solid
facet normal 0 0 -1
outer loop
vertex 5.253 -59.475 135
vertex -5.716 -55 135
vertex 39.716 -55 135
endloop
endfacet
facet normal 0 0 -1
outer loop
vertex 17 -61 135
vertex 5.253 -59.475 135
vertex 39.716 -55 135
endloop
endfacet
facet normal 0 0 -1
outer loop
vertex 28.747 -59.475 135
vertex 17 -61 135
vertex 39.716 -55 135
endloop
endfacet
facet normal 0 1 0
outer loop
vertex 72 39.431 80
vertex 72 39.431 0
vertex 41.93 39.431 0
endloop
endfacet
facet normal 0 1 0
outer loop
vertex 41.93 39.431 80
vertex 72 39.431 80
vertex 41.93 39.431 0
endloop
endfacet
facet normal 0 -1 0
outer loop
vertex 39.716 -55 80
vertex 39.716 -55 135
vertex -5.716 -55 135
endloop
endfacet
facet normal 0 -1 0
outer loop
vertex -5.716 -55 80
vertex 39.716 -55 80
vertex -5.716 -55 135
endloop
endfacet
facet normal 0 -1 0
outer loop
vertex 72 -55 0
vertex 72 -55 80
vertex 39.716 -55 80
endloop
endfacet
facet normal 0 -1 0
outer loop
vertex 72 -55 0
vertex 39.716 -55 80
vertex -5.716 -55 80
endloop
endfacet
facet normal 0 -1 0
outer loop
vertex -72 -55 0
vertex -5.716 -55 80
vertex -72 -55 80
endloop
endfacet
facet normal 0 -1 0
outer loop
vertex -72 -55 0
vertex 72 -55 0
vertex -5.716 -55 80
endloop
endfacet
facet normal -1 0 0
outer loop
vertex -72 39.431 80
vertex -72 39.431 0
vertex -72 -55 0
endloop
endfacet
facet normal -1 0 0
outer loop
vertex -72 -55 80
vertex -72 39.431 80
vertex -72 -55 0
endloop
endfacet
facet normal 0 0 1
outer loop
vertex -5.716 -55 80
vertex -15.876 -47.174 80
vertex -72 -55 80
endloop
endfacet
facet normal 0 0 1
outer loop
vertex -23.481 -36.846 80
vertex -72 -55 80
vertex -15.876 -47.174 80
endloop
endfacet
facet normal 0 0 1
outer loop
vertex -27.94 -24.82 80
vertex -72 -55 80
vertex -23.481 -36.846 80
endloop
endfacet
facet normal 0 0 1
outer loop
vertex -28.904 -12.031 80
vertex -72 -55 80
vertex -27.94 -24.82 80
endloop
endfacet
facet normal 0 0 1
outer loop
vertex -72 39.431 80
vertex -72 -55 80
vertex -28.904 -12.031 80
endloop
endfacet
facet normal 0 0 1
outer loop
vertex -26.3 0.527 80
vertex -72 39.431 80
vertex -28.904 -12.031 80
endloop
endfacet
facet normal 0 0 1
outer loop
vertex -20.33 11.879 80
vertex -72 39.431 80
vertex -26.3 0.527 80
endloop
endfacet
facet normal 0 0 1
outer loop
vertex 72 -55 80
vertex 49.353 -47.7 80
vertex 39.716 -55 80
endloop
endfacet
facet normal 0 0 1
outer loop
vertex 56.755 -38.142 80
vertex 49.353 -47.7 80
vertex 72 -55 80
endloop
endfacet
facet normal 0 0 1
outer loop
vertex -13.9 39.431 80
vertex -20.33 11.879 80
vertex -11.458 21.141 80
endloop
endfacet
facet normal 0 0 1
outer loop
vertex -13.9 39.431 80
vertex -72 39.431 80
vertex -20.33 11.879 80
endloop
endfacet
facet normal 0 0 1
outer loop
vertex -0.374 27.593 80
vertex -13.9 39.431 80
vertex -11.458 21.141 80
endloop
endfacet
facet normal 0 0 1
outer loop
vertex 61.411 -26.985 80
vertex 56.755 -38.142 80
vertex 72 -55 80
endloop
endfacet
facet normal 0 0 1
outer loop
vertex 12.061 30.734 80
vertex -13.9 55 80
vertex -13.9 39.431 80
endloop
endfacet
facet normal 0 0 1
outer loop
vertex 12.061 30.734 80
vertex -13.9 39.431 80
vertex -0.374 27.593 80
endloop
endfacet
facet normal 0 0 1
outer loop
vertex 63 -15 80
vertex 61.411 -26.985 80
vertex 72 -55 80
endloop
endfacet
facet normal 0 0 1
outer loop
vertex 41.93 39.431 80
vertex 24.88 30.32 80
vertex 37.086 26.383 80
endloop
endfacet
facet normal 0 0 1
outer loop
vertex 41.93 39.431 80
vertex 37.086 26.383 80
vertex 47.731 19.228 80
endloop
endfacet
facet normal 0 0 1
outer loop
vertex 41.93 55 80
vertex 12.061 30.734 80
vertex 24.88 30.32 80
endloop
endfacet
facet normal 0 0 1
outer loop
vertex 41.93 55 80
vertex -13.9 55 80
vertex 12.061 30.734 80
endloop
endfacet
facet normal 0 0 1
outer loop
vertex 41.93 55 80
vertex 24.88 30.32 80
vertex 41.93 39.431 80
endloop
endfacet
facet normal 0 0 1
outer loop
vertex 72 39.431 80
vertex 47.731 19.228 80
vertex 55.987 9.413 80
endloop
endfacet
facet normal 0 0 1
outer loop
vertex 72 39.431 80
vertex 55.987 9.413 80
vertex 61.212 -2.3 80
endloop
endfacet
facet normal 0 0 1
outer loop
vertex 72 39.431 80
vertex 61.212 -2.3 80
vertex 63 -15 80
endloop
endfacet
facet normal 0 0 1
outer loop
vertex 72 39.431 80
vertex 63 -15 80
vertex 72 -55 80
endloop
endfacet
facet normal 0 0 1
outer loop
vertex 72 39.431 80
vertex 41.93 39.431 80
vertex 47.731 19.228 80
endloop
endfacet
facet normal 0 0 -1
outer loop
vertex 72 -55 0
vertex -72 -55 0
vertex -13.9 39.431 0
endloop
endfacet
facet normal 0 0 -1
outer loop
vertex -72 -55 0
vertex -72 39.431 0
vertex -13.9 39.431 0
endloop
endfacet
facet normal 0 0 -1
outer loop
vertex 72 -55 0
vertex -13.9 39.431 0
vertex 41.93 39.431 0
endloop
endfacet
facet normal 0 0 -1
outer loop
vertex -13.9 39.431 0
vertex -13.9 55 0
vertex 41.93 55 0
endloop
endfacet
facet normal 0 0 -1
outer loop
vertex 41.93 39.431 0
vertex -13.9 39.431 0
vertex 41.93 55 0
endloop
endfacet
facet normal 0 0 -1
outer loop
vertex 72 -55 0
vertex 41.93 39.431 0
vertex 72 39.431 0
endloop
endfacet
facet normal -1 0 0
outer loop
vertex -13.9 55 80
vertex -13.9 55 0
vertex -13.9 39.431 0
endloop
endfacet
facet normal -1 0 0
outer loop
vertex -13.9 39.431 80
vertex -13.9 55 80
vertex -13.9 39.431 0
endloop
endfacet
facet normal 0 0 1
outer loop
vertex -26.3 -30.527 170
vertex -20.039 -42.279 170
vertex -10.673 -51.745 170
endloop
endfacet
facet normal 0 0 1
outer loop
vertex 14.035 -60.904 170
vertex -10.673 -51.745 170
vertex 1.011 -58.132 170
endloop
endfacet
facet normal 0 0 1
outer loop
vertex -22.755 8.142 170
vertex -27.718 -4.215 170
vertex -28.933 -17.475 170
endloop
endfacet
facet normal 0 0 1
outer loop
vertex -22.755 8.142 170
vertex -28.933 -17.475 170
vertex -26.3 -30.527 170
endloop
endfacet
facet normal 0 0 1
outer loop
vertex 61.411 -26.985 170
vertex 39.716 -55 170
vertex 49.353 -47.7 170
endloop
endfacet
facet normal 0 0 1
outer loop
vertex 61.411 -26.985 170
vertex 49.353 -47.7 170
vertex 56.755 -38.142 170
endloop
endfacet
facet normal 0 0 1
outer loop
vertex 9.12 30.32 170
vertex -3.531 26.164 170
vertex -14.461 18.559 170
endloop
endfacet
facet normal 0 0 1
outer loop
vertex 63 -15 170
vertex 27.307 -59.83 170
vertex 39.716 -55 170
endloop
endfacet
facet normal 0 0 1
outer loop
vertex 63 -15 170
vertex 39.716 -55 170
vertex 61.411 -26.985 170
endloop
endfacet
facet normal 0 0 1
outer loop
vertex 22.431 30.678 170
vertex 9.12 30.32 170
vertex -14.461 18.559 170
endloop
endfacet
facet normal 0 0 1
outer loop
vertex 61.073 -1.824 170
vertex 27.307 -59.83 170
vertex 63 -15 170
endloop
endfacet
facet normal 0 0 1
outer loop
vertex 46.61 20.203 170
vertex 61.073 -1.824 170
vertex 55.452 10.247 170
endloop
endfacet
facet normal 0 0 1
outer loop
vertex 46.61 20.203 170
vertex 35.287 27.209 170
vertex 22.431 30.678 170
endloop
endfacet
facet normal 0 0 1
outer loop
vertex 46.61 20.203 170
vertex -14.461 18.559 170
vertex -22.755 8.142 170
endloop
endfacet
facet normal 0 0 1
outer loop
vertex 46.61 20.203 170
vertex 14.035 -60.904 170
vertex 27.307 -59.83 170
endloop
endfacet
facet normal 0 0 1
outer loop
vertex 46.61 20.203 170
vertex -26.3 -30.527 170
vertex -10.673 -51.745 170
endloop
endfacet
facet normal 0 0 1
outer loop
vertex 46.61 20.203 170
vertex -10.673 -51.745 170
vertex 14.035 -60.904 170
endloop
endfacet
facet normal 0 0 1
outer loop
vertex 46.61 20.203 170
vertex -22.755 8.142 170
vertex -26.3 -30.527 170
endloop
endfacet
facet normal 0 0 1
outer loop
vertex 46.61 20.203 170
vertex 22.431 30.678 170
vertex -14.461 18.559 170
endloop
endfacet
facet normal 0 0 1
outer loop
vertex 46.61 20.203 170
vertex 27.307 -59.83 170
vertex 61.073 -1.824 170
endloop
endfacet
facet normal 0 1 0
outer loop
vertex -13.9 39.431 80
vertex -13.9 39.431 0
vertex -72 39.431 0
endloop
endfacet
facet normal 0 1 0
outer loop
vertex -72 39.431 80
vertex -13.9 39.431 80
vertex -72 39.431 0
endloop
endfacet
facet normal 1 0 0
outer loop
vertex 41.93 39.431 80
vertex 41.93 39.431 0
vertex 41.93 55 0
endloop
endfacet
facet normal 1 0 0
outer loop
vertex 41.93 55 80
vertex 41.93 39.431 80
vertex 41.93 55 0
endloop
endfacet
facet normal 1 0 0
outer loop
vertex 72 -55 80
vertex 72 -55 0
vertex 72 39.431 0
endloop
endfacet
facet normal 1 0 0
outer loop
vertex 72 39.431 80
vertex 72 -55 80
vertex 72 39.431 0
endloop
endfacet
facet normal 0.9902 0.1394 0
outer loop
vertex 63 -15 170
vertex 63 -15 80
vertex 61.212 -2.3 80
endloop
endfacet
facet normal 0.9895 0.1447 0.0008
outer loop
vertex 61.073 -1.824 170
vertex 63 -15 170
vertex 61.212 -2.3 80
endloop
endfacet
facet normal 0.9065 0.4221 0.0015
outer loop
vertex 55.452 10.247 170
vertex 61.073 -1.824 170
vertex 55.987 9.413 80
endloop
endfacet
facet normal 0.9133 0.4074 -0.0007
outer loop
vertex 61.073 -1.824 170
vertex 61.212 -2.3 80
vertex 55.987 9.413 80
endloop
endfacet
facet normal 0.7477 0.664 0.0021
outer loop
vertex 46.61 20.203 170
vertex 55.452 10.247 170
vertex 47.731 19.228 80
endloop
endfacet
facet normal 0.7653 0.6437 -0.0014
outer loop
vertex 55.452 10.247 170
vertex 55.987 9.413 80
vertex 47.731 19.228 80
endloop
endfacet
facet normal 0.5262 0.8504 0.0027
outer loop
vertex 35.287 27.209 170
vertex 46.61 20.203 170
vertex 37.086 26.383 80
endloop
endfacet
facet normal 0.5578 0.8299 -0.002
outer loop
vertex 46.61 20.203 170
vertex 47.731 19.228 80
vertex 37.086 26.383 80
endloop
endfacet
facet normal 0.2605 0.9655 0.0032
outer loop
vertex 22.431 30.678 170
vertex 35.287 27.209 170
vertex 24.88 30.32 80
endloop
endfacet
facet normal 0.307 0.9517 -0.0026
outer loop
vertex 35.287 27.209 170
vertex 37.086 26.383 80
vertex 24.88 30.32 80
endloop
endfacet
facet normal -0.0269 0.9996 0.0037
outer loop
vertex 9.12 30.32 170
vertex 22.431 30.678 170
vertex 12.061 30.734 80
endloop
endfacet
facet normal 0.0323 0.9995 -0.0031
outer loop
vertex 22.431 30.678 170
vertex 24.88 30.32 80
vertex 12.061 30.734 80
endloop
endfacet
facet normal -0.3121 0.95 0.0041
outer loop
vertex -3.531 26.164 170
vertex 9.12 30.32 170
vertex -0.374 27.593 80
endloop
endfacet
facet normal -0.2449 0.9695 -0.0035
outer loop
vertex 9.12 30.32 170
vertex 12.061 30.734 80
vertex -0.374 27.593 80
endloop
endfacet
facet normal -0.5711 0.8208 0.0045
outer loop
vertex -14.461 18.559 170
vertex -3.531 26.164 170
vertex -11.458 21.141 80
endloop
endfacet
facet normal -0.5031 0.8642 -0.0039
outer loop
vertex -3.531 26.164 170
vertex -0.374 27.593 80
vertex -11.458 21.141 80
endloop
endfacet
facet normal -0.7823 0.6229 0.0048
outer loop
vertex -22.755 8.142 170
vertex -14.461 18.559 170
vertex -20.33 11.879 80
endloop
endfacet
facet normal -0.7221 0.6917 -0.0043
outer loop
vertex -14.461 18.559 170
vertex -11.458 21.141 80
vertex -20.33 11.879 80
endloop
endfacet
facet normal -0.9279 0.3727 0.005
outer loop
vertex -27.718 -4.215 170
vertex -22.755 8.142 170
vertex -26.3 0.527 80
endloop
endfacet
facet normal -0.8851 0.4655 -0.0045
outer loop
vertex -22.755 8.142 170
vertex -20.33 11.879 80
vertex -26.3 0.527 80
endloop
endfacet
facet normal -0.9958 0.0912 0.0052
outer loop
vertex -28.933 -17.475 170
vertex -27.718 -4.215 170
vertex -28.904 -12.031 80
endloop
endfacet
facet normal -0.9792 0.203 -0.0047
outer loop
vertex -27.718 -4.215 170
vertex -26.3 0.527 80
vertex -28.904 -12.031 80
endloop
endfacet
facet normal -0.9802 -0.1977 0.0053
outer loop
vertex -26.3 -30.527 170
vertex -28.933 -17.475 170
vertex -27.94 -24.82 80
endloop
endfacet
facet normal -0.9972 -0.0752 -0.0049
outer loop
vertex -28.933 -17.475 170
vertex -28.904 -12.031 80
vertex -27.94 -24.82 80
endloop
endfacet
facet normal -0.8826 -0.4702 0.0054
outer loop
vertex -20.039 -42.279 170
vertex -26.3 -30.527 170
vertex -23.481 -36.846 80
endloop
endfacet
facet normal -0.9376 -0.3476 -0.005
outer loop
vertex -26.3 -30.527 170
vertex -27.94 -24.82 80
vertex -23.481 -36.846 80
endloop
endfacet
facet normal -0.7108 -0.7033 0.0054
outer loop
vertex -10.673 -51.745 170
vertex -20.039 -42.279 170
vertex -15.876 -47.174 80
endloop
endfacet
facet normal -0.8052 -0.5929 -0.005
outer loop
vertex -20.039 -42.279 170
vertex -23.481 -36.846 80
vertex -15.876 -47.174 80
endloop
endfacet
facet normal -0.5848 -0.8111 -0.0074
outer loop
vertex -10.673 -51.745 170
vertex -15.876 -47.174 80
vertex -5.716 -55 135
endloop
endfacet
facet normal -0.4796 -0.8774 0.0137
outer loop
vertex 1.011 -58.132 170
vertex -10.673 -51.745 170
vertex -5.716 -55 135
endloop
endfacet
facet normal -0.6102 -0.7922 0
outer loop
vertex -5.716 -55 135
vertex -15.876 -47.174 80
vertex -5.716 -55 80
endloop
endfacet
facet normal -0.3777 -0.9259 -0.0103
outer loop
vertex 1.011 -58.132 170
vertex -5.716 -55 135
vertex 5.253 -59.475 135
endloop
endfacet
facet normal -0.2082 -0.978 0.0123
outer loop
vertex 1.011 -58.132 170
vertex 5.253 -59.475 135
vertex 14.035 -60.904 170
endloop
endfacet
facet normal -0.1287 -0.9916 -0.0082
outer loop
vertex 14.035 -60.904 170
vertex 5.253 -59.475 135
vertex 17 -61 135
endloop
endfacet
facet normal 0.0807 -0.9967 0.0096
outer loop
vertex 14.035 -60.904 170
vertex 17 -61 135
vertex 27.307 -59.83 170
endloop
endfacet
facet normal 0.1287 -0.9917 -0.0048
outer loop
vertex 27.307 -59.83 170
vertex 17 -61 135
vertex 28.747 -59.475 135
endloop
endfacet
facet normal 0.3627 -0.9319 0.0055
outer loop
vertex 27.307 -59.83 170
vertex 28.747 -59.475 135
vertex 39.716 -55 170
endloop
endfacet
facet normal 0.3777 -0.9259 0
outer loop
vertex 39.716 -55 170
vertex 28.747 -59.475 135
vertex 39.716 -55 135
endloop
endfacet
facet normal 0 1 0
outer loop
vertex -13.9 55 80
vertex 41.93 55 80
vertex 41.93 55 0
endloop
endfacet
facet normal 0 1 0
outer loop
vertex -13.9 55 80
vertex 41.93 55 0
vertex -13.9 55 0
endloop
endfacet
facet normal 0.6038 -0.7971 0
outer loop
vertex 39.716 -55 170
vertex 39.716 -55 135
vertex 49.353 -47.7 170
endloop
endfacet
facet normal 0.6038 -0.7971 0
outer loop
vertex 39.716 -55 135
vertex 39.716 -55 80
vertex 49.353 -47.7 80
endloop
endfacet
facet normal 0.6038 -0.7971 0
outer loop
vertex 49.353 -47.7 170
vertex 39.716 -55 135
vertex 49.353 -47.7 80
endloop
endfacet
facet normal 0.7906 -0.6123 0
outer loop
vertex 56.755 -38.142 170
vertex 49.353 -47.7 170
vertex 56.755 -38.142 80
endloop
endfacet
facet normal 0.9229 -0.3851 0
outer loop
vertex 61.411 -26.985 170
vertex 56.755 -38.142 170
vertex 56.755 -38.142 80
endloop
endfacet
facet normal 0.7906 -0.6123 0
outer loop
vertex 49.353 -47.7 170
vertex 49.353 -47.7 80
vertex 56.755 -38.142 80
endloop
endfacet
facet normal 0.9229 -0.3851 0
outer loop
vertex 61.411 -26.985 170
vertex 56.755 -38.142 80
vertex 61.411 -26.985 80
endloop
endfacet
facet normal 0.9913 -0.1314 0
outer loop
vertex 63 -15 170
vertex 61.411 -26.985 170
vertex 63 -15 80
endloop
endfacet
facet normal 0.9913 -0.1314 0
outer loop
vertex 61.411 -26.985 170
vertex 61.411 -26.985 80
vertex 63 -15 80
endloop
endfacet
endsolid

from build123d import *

# Parameters (mm, degrees)
F1_DEPTH = 80
F2_DEPTH = 170
F3_DEPTH = 135


with BuildPart() as f1:
    # F0 (on Top) → F1 (new body)
    with BuildSketch(Plane.XY):
        with BuildLine():
            Line((41.930038482, 39.4312292337), (41.930038482, 55))
            Line((41.930038482, 55), (-13.9003656805, 55))
            Line((-13.9003656805, 55), (-13.9003656805, 39.4312292337))
            Line((-13.9003656805, 39.4312292337), (-72, 39.4312292337))
            Line((-72, 39.4312292337), (-72, -55))
            Line((-72, -55), (-5.7156333832, -55))
            ThreePointArc((-5.7156333832, -55), (-6.1417465241, 24.75499425), (63, -15))
            ThreePointArc((63, -15), (56.75499425, -38.1417465241), (39.7156333832, -55))
            Line((39.7156333832, -55), (72, -55))
            Line((72, -55), (72, 39.4312292337))
            Line((72, 39.4312292337), (41.930038482, 39.4312292337))
        make_face()
    extrude(amount=F1_DEPTH)

    # F0 (on Top) → F2 (join)
    with BuildSketch(Plane.XY):
        with BuildLine():
            ThreePointArc((-5.7156333832, -55), (17, -61), (39.7156333832, -55))
            Line((39.7156333832, -55), (-5.7156333832, -55))
        make_face()
        with BuildLine():
            Line((-5.7156333832, -55), (39.7156333832, -55))
            ThreePointArc((39.7156333832, -55), (56.75499425, -38.1417465241), (63, -15))
            ThreePointArc((63, -15), (-6.1417465241, 24.75499425), (-5.7156333832, -55))
        make_face()
    extrude(amount=F2_DEPTH)

    # F0 (on Top) → F3 (cut)
    with BuildSketch(Plane.XY):
        with BuildLine():
            ThreePointArc((-5.7156333832, -55), (17, -61), (39.7156333832, -55))
            Line((39.7156333832, -55), (-5.7156333832, -55))
        make_face()
    extrude(amount=F3_DEPTH, mode=Mode.SUBTRACT)


solid = f1.part
